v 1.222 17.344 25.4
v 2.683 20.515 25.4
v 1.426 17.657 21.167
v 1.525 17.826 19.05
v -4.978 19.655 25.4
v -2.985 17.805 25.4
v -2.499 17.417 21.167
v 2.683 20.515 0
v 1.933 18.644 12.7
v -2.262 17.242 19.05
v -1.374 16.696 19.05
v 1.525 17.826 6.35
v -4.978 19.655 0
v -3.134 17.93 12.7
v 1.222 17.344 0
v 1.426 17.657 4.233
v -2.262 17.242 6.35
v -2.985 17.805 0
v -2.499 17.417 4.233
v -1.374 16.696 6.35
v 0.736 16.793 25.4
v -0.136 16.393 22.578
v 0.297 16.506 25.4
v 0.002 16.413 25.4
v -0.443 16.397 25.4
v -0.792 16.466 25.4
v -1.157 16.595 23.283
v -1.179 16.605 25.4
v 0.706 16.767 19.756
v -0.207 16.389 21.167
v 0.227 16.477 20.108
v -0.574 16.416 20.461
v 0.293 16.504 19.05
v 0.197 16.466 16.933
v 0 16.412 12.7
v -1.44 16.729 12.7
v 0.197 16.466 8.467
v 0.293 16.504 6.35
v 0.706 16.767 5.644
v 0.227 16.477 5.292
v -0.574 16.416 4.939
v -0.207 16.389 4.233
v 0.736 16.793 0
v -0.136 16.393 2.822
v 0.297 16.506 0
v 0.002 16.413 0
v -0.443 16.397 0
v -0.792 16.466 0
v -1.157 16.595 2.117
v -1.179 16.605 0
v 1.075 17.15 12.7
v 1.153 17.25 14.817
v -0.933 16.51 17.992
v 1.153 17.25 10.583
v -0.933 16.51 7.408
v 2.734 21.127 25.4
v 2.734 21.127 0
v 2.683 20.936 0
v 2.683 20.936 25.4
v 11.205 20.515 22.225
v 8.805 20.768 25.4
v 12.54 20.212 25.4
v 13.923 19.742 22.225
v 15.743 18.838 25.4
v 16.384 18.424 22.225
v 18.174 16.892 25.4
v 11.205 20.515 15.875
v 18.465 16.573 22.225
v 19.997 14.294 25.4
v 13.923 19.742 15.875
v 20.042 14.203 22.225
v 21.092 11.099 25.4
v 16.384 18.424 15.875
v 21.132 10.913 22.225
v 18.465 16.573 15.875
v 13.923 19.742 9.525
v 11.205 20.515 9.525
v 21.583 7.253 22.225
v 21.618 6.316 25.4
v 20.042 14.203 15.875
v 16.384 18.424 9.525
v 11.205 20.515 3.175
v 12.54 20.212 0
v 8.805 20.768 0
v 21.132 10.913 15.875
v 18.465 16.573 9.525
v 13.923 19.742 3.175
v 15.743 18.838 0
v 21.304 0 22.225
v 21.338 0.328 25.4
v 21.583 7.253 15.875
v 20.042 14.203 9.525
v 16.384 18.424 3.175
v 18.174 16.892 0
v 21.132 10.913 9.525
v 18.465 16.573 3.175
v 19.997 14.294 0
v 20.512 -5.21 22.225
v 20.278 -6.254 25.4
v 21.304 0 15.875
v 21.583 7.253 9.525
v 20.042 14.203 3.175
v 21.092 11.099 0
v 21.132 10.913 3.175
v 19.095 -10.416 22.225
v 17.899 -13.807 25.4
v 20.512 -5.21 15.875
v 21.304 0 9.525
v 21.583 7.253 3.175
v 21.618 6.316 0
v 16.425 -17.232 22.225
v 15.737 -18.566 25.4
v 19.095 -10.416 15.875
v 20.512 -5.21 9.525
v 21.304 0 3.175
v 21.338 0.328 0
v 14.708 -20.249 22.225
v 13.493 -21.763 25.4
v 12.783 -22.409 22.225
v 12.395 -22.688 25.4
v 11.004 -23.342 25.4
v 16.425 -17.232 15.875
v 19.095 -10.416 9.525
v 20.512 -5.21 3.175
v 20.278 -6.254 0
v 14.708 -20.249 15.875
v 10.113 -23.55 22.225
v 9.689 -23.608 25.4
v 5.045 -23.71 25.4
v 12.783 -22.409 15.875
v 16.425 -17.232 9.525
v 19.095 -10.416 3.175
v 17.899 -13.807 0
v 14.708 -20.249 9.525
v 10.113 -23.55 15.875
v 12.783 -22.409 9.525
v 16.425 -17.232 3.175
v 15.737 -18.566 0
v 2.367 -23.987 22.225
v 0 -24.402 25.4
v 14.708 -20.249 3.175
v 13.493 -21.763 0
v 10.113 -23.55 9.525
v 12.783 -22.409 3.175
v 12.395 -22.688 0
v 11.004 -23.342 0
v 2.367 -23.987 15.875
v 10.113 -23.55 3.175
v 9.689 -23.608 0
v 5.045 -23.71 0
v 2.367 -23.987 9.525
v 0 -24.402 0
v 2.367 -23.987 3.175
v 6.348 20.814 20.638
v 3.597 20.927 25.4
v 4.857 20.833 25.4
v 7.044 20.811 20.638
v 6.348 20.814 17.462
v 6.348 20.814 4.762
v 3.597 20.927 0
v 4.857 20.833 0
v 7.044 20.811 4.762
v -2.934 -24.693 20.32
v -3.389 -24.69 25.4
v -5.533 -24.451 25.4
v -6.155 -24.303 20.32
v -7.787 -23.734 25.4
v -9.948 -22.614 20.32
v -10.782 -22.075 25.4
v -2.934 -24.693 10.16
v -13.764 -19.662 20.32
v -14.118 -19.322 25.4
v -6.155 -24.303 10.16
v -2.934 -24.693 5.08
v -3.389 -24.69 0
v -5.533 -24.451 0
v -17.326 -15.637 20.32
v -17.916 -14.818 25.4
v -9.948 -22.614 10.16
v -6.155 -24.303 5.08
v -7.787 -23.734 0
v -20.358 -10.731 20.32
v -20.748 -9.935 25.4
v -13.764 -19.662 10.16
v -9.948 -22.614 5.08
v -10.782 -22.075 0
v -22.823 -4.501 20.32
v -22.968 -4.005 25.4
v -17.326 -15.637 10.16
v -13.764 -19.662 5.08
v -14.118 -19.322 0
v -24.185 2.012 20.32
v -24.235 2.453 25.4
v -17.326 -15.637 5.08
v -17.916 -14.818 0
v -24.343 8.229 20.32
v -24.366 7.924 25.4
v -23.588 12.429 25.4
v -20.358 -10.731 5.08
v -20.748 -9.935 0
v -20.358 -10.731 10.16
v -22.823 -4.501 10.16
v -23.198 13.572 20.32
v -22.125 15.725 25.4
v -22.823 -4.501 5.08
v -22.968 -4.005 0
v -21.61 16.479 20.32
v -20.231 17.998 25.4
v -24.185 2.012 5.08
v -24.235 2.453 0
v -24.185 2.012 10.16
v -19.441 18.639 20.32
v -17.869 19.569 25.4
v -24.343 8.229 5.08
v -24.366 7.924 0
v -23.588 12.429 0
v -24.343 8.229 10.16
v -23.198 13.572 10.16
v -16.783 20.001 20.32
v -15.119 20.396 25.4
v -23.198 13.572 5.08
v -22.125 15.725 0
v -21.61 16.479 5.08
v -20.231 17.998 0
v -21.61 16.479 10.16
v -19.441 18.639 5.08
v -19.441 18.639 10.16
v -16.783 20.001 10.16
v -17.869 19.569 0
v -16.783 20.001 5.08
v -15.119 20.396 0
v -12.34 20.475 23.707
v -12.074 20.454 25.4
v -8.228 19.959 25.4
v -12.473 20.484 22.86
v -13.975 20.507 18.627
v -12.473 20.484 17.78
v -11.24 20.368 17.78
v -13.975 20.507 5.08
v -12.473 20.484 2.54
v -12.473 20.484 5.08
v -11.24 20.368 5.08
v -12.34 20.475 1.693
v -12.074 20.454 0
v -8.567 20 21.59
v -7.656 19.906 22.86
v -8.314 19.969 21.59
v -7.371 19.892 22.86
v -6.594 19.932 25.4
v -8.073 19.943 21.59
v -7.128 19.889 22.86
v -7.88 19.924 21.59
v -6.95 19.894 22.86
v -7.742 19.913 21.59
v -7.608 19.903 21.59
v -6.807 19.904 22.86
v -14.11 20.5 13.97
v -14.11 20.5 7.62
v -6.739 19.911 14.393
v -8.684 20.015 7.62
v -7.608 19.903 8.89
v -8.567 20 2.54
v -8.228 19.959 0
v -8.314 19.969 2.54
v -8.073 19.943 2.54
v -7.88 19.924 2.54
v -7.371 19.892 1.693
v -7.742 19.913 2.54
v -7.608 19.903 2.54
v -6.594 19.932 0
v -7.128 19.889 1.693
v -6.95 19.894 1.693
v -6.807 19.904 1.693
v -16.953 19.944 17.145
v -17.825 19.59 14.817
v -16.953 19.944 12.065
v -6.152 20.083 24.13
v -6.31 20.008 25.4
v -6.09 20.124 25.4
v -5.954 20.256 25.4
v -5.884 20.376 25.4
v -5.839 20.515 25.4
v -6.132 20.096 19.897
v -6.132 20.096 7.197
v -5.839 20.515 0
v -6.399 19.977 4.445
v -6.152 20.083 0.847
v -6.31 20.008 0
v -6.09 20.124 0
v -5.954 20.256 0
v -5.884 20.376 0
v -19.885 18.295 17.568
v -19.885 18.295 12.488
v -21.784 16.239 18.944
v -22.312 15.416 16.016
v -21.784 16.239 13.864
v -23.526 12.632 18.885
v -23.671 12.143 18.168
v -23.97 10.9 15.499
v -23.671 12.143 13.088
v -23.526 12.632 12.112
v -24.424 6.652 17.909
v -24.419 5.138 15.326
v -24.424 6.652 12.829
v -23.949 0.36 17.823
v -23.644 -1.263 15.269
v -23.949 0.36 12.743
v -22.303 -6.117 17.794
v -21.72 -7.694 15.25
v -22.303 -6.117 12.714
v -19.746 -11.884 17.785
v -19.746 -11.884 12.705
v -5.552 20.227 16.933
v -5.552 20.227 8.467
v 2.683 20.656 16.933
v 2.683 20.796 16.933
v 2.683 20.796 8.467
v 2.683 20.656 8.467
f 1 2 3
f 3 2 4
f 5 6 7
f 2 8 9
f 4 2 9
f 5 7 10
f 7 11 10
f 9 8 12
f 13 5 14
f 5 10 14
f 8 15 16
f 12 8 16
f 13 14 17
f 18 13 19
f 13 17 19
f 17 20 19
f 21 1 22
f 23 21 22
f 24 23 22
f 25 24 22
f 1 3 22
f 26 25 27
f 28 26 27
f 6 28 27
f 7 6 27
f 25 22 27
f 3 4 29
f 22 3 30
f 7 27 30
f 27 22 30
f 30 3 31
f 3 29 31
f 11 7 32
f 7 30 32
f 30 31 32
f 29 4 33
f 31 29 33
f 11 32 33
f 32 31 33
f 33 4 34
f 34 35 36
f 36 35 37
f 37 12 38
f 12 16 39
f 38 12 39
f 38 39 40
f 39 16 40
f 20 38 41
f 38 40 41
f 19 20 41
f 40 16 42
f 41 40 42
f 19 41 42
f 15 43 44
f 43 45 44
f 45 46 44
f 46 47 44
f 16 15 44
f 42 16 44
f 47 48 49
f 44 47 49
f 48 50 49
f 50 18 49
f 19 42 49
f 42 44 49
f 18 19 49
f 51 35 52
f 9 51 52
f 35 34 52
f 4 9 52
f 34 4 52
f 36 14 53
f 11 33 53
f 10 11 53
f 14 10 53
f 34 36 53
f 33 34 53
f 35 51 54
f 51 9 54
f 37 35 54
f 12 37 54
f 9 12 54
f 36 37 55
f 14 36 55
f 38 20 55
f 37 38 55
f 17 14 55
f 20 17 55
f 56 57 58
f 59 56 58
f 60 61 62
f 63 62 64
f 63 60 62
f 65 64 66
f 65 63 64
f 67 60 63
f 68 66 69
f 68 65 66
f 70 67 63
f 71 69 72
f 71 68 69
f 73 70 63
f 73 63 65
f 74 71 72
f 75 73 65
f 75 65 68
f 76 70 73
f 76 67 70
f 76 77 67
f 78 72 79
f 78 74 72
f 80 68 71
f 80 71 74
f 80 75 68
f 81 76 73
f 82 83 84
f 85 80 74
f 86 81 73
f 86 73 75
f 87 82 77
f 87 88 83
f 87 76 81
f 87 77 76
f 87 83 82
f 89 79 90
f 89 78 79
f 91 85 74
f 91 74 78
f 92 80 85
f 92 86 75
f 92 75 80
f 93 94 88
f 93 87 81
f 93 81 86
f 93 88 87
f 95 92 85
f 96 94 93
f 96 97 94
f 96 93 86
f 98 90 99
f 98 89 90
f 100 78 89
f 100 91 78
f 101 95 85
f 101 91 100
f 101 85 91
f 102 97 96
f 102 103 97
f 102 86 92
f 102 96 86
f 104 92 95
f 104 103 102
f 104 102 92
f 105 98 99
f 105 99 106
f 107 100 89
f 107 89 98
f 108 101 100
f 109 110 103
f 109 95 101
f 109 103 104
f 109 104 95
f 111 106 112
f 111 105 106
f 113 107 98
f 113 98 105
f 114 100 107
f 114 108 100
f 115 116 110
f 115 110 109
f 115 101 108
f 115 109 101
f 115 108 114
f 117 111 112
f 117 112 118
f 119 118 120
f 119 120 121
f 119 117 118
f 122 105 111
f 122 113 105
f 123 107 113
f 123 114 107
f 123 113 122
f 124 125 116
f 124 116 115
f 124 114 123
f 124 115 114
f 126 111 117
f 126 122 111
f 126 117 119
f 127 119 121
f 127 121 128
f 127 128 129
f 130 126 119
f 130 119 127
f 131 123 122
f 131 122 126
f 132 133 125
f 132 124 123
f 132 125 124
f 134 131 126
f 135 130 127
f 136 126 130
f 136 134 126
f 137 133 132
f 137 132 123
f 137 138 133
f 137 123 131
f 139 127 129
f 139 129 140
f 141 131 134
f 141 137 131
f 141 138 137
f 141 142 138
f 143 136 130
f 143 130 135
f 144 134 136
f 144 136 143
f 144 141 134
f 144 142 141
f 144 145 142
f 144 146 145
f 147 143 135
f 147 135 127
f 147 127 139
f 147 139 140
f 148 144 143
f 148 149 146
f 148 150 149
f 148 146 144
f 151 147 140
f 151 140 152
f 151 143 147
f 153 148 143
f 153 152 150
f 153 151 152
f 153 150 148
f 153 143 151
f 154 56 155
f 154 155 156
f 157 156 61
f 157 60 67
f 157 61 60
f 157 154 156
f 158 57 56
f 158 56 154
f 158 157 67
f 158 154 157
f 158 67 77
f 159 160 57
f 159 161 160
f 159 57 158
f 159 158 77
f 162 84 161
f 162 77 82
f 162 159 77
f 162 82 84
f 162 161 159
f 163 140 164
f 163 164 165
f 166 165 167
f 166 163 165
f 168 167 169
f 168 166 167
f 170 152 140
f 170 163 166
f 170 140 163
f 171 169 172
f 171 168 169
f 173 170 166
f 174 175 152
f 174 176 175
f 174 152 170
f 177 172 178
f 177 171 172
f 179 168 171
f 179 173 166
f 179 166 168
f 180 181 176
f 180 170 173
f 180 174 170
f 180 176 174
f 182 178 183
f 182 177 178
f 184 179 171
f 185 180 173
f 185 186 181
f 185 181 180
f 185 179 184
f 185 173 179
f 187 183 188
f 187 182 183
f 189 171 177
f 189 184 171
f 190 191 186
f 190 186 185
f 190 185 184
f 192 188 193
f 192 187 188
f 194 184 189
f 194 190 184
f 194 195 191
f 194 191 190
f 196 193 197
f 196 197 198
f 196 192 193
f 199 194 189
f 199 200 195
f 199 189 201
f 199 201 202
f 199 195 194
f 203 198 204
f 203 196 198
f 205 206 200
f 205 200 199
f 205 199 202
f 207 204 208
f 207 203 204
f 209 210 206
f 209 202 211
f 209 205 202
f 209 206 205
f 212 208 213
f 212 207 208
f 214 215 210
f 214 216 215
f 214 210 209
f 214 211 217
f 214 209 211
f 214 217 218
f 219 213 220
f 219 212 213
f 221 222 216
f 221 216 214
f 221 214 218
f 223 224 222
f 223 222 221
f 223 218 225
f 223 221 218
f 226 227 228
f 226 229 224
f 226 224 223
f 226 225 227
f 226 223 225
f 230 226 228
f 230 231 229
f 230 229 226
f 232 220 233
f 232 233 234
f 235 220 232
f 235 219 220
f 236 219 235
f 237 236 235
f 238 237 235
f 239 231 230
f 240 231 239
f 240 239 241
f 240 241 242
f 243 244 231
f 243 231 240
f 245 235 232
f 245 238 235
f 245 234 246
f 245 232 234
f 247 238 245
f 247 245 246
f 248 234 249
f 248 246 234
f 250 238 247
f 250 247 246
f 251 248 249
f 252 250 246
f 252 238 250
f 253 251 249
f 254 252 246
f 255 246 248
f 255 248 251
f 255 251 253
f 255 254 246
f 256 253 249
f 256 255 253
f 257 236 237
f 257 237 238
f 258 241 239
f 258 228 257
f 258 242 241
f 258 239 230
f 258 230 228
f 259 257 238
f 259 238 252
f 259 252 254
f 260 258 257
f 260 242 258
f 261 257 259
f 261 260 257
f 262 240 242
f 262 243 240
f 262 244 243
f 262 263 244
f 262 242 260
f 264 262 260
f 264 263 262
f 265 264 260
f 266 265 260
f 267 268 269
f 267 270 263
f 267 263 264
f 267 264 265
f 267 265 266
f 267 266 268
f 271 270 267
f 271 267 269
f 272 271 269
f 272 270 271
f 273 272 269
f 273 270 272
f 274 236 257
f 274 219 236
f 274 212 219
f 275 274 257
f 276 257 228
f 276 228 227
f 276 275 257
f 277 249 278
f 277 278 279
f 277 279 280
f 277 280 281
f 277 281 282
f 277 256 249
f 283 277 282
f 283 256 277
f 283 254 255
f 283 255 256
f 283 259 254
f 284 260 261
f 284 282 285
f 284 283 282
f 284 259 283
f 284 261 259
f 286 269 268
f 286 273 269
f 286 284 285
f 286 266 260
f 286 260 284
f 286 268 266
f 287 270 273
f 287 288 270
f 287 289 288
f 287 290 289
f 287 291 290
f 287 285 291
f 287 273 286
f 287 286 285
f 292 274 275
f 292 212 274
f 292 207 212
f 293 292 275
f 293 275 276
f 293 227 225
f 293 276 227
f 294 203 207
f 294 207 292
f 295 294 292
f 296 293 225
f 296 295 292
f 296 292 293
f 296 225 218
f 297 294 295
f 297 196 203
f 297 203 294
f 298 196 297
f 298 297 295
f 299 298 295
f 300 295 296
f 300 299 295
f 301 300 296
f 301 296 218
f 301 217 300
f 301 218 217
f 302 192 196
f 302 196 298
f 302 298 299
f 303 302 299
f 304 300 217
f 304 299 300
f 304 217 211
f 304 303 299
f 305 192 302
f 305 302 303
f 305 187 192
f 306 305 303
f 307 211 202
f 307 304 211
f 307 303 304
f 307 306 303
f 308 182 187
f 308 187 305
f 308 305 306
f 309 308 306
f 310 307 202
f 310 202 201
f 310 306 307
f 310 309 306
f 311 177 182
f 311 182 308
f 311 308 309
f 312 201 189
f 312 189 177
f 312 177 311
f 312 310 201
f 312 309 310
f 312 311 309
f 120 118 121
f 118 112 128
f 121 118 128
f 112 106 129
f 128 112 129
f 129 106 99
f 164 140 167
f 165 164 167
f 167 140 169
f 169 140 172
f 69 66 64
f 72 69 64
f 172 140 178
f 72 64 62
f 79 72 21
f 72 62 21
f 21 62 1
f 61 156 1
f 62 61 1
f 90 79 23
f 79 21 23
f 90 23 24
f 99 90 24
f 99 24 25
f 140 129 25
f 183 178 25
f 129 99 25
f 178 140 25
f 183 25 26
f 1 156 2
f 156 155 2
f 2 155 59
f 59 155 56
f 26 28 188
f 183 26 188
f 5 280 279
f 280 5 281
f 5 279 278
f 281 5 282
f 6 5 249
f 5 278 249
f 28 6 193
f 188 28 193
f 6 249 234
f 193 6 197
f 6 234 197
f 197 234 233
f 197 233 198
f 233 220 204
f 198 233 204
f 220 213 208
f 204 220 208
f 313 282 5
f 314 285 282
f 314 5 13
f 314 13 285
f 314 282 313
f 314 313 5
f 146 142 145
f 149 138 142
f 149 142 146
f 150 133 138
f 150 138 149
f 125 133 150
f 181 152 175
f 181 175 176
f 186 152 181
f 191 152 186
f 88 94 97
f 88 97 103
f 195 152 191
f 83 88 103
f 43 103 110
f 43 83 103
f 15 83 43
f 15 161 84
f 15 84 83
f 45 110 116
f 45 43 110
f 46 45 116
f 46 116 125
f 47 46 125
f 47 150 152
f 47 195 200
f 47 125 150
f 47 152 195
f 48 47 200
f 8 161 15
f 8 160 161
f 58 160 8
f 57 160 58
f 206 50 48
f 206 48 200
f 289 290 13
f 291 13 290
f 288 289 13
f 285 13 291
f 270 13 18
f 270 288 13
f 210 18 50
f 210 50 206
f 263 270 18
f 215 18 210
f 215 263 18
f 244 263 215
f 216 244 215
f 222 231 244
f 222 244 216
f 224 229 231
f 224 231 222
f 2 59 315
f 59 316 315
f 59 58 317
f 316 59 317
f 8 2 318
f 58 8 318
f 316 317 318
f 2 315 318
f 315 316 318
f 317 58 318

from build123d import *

# Parameters (mm, degrees)
F1_DEPTH = 25.4


with BuildPart() as f1:
    # F0 (on Top) → F1 (new body)
    with BuildSketch(Plane.XY):
        with BuildLine():
            add(Edge.make_bspline(
                [(0, 16.4123084396), (1.2200616504, 16.6464344415), (1.9514227621, 18.5809102283), (2.6827838738, 20.5153860152)],
                knots=[0.5468016302, 0.5468016302, 0.5468016302, 0.5468016302, 1, 1, 1, 1], degree=3))
            Line((0, 16.4123084396), (0, -24.4021035616))
            add(Edge.make_bspline(
                [(2.7344317625, 21.1269656467), (4.3619516884, 20.5278971438), (11.9761249056, 21.7425858169), (22.207718454, 15.2370149441), (21.5670381154, -0.5807645638), (19.6809851156, -9.7595184086), (14.0490357914, -23.8626322199), (7.3445930023, -23.6196180627), (3.5852921603, -23.7099375503), (0.8349352795, -24.2645396907), (0, -24.4021035616)],
                knots=[0.0006542248, 0.0006542248, 0.0006542248, 0.0006542248, 0.0617120582, 0.131283657, 0.2110013704, 0.2798871598, 0.3576074262, 0.4071717299, 0.4546590114, 0.4738187916, 0.4738187916, 0.4738187916, 0.4738187916], degree=3))
            Line((2.7344317625, 21.1269656467), (2.6827838738, 20.9362134337))
            add(Edge.make_bspline(
                [(2.6827838738, 20.9362134337), (2.6827838738, 20.7959376276), (2.6827838738, 20.6556618214), (2.6827838738, 20.5153860152)],
                knots=[0.2104137093, 0.2104137093, 0.2104137093, 0.2104137093, 0.6312411278, 0.6312411278, 0.6312411278, 0.6312411278], degree=3))
        make_face()
        with BuildLine():
            Line((0, -24.4021035616), (0, 16.4123084396))
            add(Edge.make_bspline(
                [(-4.9784243836, 19.6551613061), (-3.0930535372, 17.7882437458), (-1.278294462, 16.1670077439), (0, 16.4123084396)],
                knots=[0.0719723737, 0.0719723737, 0.0719723737, 0.0719723737, 0.5468016302, 0.5468016302, 0.5468016302, 0.5468016302], degree=3))
            add(Edge.make_bspline(
                [(-5.8389957994, 20.5153860152), (-5.5515978909, 20.2267629291), (-5.2641999823, 19.9381398429), (-4.9784243836, 19.6551613061)],
                knots=[0, 0, 0, 0, 0.0719723737, 0.0719723737, 0.0719723737, 0.0719723737], degree=3))
            add(Edge.make_bspline(
                [(0, -24.4021035616), (-1.8515668673, -24.7071675729), (-8.4776442362, -25.3395773837), (-23.1725456339, -11.9704367404), (-26.5380656051, 14.3249040578), (-15.1679246871, 22.4617705994), (-6.143830471, 19.0654599224), (-5.8389957994, 20.5153860152)],
                knots=[0.4738187916, 0.4738187916, 0.4738187916, 0.4738187916, 0.5163078506, 0.60987728, 0.7143042567, 0.7866441933, 0.8459454691, 0.8459454691, 0.8459454691, 0.8459454691], degree=3))
        make_face()
    extrude(amount=F1_DEPTH)


solid = f1.part
